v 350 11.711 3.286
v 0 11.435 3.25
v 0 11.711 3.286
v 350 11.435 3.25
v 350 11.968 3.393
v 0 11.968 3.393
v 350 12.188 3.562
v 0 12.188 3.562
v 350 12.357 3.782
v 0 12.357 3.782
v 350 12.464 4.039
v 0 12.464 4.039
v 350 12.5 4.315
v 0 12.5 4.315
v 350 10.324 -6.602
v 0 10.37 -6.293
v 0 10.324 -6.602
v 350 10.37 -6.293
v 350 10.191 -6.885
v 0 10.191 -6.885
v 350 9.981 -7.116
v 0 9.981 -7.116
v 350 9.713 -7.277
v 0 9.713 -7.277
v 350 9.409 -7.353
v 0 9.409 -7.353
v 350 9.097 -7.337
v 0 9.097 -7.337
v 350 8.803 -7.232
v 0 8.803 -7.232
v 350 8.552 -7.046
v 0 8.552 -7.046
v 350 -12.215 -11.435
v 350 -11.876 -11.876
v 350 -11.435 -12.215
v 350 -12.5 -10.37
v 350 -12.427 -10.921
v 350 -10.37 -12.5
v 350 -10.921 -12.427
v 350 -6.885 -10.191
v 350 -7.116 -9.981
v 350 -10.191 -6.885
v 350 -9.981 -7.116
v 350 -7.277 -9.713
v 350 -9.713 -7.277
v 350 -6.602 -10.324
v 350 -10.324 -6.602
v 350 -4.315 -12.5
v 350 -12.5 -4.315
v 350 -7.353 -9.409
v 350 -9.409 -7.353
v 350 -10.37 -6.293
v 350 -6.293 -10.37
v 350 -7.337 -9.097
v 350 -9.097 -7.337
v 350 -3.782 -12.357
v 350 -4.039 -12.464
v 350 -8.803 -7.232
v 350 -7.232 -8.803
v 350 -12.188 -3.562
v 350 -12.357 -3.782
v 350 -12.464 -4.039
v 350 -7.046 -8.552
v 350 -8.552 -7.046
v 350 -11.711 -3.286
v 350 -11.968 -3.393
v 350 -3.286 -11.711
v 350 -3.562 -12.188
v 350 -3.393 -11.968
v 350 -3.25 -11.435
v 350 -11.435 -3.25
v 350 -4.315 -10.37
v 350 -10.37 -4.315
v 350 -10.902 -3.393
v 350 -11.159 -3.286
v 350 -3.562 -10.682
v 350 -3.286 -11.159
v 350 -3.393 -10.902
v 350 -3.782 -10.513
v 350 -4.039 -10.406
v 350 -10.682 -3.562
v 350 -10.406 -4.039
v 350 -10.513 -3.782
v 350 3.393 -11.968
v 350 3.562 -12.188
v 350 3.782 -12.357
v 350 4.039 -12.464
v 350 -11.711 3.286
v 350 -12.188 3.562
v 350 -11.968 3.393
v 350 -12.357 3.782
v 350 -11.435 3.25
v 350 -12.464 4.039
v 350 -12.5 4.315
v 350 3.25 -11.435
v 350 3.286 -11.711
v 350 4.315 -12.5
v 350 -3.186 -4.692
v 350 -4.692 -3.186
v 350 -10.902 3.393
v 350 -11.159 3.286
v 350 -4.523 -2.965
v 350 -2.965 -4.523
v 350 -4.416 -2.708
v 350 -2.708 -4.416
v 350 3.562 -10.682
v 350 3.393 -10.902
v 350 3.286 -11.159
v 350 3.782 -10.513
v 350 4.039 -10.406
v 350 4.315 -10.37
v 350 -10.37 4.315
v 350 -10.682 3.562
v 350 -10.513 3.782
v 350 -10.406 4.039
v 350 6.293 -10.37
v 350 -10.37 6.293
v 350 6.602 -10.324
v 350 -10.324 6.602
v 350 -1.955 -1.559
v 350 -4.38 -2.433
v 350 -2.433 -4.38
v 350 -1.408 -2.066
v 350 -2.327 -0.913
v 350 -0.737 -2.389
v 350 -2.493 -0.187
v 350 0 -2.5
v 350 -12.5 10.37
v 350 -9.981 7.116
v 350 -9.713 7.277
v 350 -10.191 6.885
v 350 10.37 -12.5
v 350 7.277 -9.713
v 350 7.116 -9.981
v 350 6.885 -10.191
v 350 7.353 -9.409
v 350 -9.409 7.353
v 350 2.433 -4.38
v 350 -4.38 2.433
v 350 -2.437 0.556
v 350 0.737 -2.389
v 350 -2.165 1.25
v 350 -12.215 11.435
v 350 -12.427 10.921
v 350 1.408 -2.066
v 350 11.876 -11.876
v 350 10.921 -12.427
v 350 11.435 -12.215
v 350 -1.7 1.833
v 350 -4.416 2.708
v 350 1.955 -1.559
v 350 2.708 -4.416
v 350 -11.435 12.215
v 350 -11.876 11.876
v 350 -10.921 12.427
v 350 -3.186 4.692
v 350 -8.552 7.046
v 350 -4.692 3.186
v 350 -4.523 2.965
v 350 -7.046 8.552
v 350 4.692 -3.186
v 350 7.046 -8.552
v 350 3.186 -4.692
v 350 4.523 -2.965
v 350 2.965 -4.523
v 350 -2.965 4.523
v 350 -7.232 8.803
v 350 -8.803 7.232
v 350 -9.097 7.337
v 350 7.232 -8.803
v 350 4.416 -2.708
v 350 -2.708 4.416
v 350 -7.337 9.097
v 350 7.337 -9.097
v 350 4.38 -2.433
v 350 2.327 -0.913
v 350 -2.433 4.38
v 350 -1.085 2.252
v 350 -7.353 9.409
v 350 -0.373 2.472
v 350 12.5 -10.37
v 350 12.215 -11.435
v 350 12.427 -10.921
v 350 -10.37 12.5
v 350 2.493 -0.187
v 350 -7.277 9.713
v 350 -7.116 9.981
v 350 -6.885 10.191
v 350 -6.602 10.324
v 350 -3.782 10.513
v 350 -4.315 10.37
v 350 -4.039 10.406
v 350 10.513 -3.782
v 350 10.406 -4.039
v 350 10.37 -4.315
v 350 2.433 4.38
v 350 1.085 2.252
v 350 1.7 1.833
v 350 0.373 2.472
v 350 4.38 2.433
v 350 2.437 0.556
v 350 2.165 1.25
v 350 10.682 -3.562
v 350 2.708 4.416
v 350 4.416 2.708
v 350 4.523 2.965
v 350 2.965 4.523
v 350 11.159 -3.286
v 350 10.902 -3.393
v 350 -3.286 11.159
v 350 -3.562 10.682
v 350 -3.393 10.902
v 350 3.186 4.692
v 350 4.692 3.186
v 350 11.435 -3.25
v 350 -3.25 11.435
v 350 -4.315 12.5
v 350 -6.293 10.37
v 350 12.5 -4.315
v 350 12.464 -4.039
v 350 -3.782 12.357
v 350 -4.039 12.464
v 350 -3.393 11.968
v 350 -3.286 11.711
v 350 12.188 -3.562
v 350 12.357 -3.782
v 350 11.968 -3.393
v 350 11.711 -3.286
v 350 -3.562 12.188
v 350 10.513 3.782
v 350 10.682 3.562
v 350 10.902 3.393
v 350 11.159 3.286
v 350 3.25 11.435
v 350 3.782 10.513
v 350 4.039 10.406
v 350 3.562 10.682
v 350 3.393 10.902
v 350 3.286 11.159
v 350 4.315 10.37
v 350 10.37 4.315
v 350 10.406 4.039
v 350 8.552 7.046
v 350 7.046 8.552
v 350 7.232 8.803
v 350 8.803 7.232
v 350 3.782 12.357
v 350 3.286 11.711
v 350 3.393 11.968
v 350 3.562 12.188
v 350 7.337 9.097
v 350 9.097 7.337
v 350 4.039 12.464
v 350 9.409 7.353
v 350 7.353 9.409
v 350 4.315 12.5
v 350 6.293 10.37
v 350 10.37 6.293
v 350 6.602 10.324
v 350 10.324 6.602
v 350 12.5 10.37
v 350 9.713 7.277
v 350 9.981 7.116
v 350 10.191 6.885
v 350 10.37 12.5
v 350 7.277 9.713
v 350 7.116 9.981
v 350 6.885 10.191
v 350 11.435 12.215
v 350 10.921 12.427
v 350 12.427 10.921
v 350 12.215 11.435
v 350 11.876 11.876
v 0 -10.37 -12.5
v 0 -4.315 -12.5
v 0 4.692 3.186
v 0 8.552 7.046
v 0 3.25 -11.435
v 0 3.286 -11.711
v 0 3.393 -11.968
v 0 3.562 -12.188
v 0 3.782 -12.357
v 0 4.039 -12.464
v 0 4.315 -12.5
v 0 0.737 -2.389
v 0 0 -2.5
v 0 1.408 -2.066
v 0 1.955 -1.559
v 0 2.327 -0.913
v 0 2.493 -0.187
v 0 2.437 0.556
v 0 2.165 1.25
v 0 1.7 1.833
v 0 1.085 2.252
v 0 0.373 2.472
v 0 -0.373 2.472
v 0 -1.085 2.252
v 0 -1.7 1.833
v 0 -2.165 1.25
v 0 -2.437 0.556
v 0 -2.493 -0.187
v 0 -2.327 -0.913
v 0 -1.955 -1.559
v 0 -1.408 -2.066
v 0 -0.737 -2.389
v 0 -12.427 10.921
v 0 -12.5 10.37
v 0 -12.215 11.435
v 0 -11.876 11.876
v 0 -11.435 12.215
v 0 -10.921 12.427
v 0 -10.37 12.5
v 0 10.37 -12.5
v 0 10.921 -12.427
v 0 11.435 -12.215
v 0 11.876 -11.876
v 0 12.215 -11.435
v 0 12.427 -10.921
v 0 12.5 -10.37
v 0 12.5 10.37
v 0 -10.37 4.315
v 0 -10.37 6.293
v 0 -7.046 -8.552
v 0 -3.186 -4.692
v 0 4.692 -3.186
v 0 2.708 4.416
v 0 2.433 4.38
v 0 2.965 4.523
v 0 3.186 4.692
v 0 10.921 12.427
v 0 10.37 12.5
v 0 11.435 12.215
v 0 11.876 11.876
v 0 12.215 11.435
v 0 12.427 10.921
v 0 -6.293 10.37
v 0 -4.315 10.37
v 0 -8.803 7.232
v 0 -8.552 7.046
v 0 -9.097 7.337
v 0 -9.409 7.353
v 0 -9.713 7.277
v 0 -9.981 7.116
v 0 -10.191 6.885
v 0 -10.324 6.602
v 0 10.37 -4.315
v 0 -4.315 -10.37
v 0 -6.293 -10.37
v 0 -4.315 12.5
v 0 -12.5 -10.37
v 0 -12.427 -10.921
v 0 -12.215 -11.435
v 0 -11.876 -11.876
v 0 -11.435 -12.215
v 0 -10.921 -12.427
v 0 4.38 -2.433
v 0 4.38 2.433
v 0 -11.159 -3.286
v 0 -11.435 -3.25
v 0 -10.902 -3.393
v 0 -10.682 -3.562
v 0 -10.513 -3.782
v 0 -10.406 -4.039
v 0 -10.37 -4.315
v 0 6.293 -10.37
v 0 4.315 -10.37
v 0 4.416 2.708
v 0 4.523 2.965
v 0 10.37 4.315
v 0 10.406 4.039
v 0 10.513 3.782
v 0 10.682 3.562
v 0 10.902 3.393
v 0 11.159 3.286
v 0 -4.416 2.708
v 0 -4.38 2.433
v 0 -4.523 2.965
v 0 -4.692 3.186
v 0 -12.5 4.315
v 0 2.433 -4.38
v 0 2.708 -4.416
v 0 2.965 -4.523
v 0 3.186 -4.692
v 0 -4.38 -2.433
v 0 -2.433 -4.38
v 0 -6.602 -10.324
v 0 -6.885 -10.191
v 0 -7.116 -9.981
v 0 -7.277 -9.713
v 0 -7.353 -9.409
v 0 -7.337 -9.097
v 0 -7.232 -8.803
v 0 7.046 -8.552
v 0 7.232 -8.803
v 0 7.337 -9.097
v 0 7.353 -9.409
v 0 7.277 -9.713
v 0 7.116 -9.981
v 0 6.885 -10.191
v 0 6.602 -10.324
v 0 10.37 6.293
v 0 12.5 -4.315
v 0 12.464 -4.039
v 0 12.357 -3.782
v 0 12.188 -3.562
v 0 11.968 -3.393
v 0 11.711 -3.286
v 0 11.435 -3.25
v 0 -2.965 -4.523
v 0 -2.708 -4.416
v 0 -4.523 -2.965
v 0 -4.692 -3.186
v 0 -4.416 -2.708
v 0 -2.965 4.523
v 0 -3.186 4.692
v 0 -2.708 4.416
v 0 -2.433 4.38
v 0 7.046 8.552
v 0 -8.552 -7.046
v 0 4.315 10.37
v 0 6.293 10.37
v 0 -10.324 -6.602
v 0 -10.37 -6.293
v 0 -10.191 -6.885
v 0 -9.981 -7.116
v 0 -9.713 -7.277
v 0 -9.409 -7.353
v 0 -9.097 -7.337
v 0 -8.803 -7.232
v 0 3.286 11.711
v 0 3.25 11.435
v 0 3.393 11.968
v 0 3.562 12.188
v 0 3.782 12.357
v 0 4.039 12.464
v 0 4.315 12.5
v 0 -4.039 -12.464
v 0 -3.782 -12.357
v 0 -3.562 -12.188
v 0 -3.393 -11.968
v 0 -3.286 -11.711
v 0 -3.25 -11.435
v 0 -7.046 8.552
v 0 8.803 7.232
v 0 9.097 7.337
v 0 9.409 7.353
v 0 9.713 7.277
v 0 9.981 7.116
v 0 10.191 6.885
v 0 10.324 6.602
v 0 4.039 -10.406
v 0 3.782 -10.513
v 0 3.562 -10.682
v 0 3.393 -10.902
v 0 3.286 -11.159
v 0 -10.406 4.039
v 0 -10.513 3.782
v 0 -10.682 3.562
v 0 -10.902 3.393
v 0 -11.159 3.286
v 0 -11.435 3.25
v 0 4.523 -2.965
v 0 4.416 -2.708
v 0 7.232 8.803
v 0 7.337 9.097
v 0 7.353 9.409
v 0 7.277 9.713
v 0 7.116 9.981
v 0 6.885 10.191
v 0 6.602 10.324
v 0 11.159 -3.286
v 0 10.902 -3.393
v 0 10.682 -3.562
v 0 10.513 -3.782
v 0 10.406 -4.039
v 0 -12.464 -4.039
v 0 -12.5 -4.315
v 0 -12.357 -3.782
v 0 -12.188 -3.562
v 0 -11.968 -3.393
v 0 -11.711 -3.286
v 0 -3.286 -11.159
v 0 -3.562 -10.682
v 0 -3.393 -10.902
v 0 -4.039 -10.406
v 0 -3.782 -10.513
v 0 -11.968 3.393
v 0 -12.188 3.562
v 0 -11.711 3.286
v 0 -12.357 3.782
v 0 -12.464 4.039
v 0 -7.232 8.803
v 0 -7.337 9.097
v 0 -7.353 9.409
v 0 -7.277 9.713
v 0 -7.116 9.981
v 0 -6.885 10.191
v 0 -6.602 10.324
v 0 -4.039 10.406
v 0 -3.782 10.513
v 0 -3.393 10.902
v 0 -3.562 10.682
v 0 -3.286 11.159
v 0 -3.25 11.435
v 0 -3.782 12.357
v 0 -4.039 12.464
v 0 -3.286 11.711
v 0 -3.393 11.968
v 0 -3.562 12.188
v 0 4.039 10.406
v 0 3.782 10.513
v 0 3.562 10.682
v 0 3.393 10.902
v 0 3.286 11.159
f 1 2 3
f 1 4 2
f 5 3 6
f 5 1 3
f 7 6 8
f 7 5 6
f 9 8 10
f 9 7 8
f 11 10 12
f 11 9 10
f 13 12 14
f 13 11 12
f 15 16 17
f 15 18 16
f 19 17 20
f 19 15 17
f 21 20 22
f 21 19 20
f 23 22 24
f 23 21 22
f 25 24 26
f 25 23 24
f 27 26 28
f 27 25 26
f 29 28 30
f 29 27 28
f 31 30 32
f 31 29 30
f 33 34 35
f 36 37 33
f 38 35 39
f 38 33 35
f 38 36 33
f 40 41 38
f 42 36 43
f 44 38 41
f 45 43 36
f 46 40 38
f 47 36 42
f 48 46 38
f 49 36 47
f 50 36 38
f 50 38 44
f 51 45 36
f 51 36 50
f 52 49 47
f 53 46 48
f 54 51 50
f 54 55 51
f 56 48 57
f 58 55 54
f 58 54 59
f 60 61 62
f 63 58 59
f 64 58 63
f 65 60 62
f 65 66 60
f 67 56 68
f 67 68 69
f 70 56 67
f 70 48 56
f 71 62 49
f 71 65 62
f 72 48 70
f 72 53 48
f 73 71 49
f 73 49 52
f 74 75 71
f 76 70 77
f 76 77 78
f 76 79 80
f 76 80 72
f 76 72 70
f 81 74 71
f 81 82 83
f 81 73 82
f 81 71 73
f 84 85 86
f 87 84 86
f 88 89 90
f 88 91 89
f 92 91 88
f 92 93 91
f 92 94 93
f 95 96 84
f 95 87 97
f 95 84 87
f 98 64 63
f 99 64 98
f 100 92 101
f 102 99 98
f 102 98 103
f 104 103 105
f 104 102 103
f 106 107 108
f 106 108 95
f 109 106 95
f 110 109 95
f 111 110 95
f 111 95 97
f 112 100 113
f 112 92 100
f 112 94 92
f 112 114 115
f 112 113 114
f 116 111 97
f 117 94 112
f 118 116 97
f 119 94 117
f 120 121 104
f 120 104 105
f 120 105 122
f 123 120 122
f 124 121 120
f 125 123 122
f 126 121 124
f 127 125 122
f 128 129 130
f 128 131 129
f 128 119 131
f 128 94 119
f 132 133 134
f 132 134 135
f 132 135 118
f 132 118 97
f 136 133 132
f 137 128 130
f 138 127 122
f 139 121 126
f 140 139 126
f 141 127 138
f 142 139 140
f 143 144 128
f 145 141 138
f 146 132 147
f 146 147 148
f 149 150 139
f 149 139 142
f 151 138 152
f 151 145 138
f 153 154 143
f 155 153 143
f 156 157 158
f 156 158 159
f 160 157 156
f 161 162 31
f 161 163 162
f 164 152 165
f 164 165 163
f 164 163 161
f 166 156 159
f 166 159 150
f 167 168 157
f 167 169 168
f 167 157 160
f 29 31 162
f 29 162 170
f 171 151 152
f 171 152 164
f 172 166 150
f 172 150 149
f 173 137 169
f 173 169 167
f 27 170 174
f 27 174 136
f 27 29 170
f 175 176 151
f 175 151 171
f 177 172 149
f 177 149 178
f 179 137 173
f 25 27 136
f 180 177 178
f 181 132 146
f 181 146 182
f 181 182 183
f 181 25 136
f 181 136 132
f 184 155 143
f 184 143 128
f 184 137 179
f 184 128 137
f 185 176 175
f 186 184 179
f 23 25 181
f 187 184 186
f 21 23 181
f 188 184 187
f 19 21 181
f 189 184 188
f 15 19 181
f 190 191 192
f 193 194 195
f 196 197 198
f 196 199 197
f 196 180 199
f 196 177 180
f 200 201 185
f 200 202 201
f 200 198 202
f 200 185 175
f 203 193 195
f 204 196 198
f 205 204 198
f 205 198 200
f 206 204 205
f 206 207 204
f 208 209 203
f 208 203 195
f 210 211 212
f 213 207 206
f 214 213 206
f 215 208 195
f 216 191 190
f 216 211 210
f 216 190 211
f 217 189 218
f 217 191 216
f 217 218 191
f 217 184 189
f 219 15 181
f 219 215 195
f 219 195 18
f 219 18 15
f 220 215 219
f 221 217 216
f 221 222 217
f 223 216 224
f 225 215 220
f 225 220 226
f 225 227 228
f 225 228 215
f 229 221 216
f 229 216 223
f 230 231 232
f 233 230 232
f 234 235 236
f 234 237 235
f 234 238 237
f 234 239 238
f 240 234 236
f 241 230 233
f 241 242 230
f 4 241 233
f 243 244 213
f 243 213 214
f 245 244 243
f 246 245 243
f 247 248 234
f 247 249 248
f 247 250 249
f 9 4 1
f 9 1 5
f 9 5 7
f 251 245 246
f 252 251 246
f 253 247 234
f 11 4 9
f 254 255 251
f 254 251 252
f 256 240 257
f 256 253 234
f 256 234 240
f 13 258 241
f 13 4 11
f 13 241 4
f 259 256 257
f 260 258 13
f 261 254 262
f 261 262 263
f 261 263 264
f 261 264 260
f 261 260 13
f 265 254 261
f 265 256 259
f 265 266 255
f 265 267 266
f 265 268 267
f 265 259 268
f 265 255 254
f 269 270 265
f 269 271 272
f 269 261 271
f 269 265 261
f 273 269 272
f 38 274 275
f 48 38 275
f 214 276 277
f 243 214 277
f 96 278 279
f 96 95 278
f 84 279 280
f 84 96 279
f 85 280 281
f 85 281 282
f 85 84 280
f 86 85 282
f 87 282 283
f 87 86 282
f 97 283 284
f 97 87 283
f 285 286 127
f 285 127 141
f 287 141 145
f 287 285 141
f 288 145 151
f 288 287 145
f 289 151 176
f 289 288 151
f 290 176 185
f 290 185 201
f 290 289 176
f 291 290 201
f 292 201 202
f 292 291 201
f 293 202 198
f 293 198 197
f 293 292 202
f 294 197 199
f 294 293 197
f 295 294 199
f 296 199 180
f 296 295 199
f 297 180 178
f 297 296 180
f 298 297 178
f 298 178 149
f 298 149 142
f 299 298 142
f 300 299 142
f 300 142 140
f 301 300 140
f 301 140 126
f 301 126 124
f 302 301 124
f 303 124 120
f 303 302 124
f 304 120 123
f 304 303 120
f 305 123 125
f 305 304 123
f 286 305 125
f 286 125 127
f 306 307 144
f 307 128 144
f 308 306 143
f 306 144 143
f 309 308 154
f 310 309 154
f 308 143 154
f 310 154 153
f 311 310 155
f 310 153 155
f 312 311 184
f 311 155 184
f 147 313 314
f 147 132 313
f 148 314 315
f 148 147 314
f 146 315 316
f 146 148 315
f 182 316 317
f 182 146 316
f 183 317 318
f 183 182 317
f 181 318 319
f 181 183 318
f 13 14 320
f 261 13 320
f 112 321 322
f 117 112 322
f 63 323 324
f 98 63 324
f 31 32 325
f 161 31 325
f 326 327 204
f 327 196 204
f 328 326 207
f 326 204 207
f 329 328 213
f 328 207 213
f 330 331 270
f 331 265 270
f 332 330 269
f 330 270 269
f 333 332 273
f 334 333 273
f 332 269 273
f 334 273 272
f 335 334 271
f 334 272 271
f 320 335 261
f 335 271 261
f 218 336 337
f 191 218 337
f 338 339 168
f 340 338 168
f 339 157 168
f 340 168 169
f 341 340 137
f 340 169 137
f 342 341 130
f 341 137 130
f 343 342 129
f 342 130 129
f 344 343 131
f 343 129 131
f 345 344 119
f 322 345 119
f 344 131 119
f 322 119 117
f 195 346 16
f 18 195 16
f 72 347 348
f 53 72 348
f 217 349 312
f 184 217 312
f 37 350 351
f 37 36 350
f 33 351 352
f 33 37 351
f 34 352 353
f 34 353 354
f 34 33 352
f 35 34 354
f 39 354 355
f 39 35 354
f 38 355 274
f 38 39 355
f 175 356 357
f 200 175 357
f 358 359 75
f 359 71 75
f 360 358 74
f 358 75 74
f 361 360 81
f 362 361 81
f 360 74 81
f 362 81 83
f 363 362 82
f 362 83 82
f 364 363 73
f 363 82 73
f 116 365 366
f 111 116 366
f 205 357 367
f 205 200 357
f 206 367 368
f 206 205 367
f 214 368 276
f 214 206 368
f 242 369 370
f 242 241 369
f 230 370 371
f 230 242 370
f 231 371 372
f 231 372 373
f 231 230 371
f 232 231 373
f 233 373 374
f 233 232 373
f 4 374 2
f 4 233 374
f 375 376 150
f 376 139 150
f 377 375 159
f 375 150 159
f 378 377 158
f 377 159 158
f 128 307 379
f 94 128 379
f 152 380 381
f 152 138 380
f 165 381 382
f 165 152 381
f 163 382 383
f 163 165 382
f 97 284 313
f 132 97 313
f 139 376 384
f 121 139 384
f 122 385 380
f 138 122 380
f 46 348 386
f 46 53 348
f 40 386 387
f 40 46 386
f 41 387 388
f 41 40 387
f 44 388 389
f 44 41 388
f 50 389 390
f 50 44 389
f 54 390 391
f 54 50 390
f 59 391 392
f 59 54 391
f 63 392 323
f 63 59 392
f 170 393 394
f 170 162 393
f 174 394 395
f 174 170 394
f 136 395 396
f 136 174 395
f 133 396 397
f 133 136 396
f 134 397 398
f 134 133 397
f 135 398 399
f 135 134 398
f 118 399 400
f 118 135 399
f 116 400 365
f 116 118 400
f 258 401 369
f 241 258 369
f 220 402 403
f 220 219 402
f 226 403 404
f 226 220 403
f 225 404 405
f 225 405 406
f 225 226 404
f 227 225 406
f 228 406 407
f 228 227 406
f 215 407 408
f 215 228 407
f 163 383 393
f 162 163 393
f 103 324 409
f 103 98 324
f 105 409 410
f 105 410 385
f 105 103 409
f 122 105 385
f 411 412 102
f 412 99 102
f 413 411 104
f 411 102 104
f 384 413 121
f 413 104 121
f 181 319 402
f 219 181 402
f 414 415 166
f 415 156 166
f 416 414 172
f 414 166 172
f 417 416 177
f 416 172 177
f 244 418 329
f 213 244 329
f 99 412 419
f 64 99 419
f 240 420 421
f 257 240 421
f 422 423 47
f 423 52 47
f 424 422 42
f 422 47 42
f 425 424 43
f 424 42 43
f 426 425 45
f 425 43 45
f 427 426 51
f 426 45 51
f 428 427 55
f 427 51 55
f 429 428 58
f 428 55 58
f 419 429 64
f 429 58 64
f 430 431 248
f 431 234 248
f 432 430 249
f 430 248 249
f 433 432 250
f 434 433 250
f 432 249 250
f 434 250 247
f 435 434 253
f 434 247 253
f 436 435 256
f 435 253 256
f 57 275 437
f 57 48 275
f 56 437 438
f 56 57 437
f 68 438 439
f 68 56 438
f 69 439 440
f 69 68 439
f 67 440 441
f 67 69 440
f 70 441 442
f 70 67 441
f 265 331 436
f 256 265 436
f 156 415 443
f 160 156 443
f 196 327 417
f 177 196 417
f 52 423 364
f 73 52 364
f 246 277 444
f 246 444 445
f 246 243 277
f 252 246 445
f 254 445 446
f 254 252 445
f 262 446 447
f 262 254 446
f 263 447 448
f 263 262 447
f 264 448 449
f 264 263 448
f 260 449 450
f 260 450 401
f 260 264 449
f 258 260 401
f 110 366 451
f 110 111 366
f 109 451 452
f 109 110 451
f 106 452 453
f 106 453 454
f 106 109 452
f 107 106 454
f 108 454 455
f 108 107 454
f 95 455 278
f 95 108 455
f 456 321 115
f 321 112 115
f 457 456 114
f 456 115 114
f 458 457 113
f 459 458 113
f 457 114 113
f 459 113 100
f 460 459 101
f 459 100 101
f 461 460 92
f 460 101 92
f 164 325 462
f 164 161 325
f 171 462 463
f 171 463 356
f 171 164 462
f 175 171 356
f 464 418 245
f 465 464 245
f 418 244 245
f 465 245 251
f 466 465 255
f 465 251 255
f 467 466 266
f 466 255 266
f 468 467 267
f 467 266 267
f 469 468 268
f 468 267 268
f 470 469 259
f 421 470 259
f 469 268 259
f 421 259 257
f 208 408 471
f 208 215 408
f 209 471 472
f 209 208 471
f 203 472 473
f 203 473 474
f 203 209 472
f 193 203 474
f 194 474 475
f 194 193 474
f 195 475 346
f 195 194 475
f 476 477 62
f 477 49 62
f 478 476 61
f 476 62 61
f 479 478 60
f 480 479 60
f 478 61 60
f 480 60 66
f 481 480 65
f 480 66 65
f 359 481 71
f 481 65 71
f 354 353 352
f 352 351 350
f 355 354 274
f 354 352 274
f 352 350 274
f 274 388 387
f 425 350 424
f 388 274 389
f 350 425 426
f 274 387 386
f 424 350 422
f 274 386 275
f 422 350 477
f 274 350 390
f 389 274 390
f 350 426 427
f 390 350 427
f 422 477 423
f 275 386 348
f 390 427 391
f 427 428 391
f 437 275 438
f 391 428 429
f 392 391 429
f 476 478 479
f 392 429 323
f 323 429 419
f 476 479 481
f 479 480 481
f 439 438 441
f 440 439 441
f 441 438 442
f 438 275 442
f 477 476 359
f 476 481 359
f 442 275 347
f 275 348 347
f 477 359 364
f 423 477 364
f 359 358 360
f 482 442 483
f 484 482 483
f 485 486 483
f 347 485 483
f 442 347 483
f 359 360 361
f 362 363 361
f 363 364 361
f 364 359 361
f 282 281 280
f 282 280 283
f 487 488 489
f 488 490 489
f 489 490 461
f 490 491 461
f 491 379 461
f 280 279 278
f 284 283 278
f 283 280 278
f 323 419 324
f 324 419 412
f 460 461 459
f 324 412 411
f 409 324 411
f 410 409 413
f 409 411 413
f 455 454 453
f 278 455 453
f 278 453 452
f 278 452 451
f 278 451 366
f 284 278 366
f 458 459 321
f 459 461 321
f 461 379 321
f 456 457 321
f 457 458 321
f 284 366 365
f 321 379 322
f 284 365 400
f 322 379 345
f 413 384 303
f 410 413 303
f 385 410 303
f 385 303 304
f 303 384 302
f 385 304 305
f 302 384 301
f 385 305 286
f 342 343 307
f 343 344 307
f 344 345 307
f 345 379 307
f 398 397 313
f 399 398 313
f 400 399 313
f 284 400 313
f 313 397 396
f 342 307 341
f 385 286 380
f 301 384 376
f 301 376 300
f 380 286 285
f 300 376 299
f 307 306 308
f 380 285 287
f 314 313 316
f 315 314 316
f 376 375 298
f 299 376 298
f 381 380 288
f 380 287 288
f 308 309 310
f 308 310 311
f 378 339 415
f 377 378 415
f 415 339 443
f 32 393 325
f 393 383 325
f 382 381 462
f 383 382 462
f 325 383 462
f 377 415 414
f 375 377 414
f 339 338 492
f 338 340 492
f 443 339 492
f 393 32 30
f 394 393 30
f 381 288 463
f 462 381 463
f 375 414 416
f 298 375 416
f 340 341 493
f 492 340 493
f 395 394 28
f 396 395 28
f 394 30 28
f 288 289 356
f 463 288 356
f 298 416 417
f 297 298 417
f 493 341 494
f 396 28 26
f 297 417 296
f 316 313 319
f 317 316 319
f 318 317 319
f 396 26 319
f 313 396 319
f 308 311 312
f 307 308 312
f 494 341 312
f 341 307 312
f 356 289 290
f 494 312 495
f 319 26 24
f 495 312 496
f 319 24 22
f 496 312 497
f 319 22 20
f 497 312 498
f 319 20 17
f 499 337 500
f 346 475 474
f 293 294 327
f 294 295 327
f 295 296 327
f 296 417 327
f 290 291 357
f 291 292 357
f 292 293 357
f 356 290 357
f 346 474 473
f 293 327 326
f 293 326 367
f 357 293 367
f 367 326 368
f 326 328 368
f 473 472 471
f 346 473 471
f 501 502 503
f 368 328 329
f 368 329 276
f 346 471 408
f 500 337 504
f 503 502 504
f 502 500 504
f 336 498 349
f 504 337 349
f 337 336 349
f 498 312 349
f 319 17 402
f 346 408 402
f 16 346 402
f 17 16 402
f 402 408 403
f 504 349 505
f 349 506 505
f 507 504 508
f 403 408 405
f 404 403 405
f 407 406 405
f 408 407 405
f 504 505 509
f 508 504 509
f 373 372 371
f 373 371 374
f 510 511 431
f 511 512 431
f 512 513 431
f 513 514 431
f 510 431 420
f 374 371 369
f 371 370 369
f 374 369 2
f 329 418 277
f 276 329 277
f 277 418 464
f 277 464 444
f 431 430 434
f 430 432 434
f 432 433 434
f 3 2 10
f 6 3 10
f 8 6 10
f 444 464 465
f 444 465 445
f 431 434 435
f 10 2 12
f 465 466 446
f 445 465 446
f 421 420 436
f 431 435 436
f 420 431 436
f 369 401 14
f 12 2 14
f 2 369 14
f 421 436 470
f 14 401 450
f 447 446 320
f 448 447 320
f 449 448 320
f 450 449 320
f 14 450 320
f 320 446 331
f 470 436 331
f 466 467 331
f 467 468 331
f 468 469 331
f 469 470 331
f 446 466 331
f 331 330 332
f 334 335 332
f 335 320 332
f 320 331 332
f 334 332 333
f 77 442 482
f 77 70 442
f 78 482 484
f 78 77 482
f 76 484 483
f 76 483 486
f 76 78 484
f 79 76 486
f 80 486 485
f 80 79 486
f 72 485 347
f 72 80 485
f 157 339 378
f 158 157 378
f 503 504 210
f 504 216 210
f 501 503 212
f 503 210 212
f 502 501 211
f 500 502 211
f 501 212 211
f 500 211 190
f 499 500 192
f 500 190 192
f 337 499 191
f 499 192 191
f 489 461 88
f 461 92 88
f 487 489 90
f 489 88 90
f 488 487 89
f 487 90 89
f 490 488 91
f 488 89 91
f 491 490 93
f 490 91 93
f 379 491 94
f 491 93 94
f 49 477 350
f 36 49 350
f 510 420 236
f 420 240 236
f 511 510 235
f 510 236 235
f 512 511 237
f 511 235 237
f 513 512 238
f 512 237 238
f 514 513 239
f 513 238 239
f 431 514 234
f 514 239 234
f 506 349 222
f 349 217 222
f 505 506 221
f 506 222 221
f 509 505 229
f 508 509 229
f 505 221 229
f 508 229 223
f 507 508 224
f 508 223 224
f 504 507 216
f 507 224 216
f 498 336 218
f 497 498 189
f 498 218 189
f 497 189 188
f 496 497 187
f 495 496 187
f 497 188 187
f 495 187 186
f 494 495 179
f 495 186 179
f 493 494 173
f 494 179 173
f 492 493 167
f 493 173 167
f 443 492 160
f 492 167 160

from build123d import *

# Parameters (mm, degrees)
SKETCH1_R           = 2.5
BOSS_EXTRUDE1_DEPTH = 350
FILLET1_R           = 1.065
FILLET2_R           = 2.13


with BuildPart() as part:
    # Sketch1 → Boss-Extrude1 (new body)
    with BuildSketch(Plane.YZ):
        Polygon((-12.5, -3.25), (-12.5, -12.5), (-3.25, -12.5), (-3.25, -10.37), (-8.863862556, -10.37), (-2.873862556, -4.38), (2.873862556, -4.38), (8.863862556, -10.37), (3.25, -10.37), (3.25, -12.5), (12.5, -12.5), (12.5, -3.25), (10.37, -3.25), (10.37, -8.863862556), (4.38, -2.873862556), (4.38, 2.873862556), (10.37, 8.863862556), (10.37, 3.25), (12.5, 3.25), (12.5, 12.5), (3.25, 12.5), (3.25, 10.37), (8.863862556, 10.37), (2.873862556, 4.38), (-2.873862556, 4.38), (-8.863862556, 10.37), (-3.25, 10.37), (-3.25, 12.5), (-12.5, 12.5), (-12.5, 3.25), (-10.37, 3.25), (-10.37, 8.863862556), (-4.38, 2.873862556), (-4.38, -2.873862556), (-10.37, -8.863862556), (-10.37, -3.25), align=None)
        with Locations(Location((0, 0, 0), (0, 0, 270))):
            Circle(SKETCH1_R, mode=Mode.SUBTRACT)
    extrude(amount=BOSS_EXTRUDE1_DEPTH)

    # Fillet1
    fillet1_edges = [part.edges().sort_by_distance(p)[0] for p in [
        (175, -10.37, -8.863862556),
        (175, 2.873862556, -4.38),
        (175, -2.873862556, -4.38),
        (175, -4.38, 2.873862556),
        (175, -4.38, -2.873862556),
        (175, -2.873862556, 4.38),
        (175, 2.873862556, 4.38),
        (175, 4.38, 2.873862556),
        (175, 4.38, -2.873862556),
        (175, -8.863862556, -10.37),
        (175, 8.863862556, -10.37),
        (175, 10.37, -8.863862556),
        (175, -10.37, 8.863862556),
        (175, -8.863862556, 10.37),
        (175, 10.37, 8.863862556),
        (175, 8.863862556, 10.37),
        (175, 12.5, 3.25),
        (175, -3.25, -12.5),
        (175, -10.37, 3.25),
        (175, 10.37, 3.25),
        (175, -10.37, -3.25),
        (175, -12.5, -3.25),
        (175, -12.5, 3.25),
        (175, 3.25, -10.37),
        (175, -3.25, -10.37),
        (175, 3.25, -12.5),
        (175, 10.37, -3.25),
        (175, 12.5, -3.25),
        (175, 3.25, 12.5),
        (175, 3.25, 10.37),
        (175, -3.25, 10.37),
        (175, -3.25, 12.5),
    ]]
    fillet(fillet1_edges, radius=FILLET1_R - 0.0001)  # a hair under: the kernel refuses the full size

    # Fillet2
    fillet2_edges = [part.edges().sort_by_distance(p)[0] for p in [
        (175, -12.5, 12.5),
        (175, 12.5, 12.5),
        (175, 12.5, -12.5),
        (175, -12.5, -12.5),
    ]]
    fillet(fillet2_edges, radius=FILLET2_R)


solid = part.part
